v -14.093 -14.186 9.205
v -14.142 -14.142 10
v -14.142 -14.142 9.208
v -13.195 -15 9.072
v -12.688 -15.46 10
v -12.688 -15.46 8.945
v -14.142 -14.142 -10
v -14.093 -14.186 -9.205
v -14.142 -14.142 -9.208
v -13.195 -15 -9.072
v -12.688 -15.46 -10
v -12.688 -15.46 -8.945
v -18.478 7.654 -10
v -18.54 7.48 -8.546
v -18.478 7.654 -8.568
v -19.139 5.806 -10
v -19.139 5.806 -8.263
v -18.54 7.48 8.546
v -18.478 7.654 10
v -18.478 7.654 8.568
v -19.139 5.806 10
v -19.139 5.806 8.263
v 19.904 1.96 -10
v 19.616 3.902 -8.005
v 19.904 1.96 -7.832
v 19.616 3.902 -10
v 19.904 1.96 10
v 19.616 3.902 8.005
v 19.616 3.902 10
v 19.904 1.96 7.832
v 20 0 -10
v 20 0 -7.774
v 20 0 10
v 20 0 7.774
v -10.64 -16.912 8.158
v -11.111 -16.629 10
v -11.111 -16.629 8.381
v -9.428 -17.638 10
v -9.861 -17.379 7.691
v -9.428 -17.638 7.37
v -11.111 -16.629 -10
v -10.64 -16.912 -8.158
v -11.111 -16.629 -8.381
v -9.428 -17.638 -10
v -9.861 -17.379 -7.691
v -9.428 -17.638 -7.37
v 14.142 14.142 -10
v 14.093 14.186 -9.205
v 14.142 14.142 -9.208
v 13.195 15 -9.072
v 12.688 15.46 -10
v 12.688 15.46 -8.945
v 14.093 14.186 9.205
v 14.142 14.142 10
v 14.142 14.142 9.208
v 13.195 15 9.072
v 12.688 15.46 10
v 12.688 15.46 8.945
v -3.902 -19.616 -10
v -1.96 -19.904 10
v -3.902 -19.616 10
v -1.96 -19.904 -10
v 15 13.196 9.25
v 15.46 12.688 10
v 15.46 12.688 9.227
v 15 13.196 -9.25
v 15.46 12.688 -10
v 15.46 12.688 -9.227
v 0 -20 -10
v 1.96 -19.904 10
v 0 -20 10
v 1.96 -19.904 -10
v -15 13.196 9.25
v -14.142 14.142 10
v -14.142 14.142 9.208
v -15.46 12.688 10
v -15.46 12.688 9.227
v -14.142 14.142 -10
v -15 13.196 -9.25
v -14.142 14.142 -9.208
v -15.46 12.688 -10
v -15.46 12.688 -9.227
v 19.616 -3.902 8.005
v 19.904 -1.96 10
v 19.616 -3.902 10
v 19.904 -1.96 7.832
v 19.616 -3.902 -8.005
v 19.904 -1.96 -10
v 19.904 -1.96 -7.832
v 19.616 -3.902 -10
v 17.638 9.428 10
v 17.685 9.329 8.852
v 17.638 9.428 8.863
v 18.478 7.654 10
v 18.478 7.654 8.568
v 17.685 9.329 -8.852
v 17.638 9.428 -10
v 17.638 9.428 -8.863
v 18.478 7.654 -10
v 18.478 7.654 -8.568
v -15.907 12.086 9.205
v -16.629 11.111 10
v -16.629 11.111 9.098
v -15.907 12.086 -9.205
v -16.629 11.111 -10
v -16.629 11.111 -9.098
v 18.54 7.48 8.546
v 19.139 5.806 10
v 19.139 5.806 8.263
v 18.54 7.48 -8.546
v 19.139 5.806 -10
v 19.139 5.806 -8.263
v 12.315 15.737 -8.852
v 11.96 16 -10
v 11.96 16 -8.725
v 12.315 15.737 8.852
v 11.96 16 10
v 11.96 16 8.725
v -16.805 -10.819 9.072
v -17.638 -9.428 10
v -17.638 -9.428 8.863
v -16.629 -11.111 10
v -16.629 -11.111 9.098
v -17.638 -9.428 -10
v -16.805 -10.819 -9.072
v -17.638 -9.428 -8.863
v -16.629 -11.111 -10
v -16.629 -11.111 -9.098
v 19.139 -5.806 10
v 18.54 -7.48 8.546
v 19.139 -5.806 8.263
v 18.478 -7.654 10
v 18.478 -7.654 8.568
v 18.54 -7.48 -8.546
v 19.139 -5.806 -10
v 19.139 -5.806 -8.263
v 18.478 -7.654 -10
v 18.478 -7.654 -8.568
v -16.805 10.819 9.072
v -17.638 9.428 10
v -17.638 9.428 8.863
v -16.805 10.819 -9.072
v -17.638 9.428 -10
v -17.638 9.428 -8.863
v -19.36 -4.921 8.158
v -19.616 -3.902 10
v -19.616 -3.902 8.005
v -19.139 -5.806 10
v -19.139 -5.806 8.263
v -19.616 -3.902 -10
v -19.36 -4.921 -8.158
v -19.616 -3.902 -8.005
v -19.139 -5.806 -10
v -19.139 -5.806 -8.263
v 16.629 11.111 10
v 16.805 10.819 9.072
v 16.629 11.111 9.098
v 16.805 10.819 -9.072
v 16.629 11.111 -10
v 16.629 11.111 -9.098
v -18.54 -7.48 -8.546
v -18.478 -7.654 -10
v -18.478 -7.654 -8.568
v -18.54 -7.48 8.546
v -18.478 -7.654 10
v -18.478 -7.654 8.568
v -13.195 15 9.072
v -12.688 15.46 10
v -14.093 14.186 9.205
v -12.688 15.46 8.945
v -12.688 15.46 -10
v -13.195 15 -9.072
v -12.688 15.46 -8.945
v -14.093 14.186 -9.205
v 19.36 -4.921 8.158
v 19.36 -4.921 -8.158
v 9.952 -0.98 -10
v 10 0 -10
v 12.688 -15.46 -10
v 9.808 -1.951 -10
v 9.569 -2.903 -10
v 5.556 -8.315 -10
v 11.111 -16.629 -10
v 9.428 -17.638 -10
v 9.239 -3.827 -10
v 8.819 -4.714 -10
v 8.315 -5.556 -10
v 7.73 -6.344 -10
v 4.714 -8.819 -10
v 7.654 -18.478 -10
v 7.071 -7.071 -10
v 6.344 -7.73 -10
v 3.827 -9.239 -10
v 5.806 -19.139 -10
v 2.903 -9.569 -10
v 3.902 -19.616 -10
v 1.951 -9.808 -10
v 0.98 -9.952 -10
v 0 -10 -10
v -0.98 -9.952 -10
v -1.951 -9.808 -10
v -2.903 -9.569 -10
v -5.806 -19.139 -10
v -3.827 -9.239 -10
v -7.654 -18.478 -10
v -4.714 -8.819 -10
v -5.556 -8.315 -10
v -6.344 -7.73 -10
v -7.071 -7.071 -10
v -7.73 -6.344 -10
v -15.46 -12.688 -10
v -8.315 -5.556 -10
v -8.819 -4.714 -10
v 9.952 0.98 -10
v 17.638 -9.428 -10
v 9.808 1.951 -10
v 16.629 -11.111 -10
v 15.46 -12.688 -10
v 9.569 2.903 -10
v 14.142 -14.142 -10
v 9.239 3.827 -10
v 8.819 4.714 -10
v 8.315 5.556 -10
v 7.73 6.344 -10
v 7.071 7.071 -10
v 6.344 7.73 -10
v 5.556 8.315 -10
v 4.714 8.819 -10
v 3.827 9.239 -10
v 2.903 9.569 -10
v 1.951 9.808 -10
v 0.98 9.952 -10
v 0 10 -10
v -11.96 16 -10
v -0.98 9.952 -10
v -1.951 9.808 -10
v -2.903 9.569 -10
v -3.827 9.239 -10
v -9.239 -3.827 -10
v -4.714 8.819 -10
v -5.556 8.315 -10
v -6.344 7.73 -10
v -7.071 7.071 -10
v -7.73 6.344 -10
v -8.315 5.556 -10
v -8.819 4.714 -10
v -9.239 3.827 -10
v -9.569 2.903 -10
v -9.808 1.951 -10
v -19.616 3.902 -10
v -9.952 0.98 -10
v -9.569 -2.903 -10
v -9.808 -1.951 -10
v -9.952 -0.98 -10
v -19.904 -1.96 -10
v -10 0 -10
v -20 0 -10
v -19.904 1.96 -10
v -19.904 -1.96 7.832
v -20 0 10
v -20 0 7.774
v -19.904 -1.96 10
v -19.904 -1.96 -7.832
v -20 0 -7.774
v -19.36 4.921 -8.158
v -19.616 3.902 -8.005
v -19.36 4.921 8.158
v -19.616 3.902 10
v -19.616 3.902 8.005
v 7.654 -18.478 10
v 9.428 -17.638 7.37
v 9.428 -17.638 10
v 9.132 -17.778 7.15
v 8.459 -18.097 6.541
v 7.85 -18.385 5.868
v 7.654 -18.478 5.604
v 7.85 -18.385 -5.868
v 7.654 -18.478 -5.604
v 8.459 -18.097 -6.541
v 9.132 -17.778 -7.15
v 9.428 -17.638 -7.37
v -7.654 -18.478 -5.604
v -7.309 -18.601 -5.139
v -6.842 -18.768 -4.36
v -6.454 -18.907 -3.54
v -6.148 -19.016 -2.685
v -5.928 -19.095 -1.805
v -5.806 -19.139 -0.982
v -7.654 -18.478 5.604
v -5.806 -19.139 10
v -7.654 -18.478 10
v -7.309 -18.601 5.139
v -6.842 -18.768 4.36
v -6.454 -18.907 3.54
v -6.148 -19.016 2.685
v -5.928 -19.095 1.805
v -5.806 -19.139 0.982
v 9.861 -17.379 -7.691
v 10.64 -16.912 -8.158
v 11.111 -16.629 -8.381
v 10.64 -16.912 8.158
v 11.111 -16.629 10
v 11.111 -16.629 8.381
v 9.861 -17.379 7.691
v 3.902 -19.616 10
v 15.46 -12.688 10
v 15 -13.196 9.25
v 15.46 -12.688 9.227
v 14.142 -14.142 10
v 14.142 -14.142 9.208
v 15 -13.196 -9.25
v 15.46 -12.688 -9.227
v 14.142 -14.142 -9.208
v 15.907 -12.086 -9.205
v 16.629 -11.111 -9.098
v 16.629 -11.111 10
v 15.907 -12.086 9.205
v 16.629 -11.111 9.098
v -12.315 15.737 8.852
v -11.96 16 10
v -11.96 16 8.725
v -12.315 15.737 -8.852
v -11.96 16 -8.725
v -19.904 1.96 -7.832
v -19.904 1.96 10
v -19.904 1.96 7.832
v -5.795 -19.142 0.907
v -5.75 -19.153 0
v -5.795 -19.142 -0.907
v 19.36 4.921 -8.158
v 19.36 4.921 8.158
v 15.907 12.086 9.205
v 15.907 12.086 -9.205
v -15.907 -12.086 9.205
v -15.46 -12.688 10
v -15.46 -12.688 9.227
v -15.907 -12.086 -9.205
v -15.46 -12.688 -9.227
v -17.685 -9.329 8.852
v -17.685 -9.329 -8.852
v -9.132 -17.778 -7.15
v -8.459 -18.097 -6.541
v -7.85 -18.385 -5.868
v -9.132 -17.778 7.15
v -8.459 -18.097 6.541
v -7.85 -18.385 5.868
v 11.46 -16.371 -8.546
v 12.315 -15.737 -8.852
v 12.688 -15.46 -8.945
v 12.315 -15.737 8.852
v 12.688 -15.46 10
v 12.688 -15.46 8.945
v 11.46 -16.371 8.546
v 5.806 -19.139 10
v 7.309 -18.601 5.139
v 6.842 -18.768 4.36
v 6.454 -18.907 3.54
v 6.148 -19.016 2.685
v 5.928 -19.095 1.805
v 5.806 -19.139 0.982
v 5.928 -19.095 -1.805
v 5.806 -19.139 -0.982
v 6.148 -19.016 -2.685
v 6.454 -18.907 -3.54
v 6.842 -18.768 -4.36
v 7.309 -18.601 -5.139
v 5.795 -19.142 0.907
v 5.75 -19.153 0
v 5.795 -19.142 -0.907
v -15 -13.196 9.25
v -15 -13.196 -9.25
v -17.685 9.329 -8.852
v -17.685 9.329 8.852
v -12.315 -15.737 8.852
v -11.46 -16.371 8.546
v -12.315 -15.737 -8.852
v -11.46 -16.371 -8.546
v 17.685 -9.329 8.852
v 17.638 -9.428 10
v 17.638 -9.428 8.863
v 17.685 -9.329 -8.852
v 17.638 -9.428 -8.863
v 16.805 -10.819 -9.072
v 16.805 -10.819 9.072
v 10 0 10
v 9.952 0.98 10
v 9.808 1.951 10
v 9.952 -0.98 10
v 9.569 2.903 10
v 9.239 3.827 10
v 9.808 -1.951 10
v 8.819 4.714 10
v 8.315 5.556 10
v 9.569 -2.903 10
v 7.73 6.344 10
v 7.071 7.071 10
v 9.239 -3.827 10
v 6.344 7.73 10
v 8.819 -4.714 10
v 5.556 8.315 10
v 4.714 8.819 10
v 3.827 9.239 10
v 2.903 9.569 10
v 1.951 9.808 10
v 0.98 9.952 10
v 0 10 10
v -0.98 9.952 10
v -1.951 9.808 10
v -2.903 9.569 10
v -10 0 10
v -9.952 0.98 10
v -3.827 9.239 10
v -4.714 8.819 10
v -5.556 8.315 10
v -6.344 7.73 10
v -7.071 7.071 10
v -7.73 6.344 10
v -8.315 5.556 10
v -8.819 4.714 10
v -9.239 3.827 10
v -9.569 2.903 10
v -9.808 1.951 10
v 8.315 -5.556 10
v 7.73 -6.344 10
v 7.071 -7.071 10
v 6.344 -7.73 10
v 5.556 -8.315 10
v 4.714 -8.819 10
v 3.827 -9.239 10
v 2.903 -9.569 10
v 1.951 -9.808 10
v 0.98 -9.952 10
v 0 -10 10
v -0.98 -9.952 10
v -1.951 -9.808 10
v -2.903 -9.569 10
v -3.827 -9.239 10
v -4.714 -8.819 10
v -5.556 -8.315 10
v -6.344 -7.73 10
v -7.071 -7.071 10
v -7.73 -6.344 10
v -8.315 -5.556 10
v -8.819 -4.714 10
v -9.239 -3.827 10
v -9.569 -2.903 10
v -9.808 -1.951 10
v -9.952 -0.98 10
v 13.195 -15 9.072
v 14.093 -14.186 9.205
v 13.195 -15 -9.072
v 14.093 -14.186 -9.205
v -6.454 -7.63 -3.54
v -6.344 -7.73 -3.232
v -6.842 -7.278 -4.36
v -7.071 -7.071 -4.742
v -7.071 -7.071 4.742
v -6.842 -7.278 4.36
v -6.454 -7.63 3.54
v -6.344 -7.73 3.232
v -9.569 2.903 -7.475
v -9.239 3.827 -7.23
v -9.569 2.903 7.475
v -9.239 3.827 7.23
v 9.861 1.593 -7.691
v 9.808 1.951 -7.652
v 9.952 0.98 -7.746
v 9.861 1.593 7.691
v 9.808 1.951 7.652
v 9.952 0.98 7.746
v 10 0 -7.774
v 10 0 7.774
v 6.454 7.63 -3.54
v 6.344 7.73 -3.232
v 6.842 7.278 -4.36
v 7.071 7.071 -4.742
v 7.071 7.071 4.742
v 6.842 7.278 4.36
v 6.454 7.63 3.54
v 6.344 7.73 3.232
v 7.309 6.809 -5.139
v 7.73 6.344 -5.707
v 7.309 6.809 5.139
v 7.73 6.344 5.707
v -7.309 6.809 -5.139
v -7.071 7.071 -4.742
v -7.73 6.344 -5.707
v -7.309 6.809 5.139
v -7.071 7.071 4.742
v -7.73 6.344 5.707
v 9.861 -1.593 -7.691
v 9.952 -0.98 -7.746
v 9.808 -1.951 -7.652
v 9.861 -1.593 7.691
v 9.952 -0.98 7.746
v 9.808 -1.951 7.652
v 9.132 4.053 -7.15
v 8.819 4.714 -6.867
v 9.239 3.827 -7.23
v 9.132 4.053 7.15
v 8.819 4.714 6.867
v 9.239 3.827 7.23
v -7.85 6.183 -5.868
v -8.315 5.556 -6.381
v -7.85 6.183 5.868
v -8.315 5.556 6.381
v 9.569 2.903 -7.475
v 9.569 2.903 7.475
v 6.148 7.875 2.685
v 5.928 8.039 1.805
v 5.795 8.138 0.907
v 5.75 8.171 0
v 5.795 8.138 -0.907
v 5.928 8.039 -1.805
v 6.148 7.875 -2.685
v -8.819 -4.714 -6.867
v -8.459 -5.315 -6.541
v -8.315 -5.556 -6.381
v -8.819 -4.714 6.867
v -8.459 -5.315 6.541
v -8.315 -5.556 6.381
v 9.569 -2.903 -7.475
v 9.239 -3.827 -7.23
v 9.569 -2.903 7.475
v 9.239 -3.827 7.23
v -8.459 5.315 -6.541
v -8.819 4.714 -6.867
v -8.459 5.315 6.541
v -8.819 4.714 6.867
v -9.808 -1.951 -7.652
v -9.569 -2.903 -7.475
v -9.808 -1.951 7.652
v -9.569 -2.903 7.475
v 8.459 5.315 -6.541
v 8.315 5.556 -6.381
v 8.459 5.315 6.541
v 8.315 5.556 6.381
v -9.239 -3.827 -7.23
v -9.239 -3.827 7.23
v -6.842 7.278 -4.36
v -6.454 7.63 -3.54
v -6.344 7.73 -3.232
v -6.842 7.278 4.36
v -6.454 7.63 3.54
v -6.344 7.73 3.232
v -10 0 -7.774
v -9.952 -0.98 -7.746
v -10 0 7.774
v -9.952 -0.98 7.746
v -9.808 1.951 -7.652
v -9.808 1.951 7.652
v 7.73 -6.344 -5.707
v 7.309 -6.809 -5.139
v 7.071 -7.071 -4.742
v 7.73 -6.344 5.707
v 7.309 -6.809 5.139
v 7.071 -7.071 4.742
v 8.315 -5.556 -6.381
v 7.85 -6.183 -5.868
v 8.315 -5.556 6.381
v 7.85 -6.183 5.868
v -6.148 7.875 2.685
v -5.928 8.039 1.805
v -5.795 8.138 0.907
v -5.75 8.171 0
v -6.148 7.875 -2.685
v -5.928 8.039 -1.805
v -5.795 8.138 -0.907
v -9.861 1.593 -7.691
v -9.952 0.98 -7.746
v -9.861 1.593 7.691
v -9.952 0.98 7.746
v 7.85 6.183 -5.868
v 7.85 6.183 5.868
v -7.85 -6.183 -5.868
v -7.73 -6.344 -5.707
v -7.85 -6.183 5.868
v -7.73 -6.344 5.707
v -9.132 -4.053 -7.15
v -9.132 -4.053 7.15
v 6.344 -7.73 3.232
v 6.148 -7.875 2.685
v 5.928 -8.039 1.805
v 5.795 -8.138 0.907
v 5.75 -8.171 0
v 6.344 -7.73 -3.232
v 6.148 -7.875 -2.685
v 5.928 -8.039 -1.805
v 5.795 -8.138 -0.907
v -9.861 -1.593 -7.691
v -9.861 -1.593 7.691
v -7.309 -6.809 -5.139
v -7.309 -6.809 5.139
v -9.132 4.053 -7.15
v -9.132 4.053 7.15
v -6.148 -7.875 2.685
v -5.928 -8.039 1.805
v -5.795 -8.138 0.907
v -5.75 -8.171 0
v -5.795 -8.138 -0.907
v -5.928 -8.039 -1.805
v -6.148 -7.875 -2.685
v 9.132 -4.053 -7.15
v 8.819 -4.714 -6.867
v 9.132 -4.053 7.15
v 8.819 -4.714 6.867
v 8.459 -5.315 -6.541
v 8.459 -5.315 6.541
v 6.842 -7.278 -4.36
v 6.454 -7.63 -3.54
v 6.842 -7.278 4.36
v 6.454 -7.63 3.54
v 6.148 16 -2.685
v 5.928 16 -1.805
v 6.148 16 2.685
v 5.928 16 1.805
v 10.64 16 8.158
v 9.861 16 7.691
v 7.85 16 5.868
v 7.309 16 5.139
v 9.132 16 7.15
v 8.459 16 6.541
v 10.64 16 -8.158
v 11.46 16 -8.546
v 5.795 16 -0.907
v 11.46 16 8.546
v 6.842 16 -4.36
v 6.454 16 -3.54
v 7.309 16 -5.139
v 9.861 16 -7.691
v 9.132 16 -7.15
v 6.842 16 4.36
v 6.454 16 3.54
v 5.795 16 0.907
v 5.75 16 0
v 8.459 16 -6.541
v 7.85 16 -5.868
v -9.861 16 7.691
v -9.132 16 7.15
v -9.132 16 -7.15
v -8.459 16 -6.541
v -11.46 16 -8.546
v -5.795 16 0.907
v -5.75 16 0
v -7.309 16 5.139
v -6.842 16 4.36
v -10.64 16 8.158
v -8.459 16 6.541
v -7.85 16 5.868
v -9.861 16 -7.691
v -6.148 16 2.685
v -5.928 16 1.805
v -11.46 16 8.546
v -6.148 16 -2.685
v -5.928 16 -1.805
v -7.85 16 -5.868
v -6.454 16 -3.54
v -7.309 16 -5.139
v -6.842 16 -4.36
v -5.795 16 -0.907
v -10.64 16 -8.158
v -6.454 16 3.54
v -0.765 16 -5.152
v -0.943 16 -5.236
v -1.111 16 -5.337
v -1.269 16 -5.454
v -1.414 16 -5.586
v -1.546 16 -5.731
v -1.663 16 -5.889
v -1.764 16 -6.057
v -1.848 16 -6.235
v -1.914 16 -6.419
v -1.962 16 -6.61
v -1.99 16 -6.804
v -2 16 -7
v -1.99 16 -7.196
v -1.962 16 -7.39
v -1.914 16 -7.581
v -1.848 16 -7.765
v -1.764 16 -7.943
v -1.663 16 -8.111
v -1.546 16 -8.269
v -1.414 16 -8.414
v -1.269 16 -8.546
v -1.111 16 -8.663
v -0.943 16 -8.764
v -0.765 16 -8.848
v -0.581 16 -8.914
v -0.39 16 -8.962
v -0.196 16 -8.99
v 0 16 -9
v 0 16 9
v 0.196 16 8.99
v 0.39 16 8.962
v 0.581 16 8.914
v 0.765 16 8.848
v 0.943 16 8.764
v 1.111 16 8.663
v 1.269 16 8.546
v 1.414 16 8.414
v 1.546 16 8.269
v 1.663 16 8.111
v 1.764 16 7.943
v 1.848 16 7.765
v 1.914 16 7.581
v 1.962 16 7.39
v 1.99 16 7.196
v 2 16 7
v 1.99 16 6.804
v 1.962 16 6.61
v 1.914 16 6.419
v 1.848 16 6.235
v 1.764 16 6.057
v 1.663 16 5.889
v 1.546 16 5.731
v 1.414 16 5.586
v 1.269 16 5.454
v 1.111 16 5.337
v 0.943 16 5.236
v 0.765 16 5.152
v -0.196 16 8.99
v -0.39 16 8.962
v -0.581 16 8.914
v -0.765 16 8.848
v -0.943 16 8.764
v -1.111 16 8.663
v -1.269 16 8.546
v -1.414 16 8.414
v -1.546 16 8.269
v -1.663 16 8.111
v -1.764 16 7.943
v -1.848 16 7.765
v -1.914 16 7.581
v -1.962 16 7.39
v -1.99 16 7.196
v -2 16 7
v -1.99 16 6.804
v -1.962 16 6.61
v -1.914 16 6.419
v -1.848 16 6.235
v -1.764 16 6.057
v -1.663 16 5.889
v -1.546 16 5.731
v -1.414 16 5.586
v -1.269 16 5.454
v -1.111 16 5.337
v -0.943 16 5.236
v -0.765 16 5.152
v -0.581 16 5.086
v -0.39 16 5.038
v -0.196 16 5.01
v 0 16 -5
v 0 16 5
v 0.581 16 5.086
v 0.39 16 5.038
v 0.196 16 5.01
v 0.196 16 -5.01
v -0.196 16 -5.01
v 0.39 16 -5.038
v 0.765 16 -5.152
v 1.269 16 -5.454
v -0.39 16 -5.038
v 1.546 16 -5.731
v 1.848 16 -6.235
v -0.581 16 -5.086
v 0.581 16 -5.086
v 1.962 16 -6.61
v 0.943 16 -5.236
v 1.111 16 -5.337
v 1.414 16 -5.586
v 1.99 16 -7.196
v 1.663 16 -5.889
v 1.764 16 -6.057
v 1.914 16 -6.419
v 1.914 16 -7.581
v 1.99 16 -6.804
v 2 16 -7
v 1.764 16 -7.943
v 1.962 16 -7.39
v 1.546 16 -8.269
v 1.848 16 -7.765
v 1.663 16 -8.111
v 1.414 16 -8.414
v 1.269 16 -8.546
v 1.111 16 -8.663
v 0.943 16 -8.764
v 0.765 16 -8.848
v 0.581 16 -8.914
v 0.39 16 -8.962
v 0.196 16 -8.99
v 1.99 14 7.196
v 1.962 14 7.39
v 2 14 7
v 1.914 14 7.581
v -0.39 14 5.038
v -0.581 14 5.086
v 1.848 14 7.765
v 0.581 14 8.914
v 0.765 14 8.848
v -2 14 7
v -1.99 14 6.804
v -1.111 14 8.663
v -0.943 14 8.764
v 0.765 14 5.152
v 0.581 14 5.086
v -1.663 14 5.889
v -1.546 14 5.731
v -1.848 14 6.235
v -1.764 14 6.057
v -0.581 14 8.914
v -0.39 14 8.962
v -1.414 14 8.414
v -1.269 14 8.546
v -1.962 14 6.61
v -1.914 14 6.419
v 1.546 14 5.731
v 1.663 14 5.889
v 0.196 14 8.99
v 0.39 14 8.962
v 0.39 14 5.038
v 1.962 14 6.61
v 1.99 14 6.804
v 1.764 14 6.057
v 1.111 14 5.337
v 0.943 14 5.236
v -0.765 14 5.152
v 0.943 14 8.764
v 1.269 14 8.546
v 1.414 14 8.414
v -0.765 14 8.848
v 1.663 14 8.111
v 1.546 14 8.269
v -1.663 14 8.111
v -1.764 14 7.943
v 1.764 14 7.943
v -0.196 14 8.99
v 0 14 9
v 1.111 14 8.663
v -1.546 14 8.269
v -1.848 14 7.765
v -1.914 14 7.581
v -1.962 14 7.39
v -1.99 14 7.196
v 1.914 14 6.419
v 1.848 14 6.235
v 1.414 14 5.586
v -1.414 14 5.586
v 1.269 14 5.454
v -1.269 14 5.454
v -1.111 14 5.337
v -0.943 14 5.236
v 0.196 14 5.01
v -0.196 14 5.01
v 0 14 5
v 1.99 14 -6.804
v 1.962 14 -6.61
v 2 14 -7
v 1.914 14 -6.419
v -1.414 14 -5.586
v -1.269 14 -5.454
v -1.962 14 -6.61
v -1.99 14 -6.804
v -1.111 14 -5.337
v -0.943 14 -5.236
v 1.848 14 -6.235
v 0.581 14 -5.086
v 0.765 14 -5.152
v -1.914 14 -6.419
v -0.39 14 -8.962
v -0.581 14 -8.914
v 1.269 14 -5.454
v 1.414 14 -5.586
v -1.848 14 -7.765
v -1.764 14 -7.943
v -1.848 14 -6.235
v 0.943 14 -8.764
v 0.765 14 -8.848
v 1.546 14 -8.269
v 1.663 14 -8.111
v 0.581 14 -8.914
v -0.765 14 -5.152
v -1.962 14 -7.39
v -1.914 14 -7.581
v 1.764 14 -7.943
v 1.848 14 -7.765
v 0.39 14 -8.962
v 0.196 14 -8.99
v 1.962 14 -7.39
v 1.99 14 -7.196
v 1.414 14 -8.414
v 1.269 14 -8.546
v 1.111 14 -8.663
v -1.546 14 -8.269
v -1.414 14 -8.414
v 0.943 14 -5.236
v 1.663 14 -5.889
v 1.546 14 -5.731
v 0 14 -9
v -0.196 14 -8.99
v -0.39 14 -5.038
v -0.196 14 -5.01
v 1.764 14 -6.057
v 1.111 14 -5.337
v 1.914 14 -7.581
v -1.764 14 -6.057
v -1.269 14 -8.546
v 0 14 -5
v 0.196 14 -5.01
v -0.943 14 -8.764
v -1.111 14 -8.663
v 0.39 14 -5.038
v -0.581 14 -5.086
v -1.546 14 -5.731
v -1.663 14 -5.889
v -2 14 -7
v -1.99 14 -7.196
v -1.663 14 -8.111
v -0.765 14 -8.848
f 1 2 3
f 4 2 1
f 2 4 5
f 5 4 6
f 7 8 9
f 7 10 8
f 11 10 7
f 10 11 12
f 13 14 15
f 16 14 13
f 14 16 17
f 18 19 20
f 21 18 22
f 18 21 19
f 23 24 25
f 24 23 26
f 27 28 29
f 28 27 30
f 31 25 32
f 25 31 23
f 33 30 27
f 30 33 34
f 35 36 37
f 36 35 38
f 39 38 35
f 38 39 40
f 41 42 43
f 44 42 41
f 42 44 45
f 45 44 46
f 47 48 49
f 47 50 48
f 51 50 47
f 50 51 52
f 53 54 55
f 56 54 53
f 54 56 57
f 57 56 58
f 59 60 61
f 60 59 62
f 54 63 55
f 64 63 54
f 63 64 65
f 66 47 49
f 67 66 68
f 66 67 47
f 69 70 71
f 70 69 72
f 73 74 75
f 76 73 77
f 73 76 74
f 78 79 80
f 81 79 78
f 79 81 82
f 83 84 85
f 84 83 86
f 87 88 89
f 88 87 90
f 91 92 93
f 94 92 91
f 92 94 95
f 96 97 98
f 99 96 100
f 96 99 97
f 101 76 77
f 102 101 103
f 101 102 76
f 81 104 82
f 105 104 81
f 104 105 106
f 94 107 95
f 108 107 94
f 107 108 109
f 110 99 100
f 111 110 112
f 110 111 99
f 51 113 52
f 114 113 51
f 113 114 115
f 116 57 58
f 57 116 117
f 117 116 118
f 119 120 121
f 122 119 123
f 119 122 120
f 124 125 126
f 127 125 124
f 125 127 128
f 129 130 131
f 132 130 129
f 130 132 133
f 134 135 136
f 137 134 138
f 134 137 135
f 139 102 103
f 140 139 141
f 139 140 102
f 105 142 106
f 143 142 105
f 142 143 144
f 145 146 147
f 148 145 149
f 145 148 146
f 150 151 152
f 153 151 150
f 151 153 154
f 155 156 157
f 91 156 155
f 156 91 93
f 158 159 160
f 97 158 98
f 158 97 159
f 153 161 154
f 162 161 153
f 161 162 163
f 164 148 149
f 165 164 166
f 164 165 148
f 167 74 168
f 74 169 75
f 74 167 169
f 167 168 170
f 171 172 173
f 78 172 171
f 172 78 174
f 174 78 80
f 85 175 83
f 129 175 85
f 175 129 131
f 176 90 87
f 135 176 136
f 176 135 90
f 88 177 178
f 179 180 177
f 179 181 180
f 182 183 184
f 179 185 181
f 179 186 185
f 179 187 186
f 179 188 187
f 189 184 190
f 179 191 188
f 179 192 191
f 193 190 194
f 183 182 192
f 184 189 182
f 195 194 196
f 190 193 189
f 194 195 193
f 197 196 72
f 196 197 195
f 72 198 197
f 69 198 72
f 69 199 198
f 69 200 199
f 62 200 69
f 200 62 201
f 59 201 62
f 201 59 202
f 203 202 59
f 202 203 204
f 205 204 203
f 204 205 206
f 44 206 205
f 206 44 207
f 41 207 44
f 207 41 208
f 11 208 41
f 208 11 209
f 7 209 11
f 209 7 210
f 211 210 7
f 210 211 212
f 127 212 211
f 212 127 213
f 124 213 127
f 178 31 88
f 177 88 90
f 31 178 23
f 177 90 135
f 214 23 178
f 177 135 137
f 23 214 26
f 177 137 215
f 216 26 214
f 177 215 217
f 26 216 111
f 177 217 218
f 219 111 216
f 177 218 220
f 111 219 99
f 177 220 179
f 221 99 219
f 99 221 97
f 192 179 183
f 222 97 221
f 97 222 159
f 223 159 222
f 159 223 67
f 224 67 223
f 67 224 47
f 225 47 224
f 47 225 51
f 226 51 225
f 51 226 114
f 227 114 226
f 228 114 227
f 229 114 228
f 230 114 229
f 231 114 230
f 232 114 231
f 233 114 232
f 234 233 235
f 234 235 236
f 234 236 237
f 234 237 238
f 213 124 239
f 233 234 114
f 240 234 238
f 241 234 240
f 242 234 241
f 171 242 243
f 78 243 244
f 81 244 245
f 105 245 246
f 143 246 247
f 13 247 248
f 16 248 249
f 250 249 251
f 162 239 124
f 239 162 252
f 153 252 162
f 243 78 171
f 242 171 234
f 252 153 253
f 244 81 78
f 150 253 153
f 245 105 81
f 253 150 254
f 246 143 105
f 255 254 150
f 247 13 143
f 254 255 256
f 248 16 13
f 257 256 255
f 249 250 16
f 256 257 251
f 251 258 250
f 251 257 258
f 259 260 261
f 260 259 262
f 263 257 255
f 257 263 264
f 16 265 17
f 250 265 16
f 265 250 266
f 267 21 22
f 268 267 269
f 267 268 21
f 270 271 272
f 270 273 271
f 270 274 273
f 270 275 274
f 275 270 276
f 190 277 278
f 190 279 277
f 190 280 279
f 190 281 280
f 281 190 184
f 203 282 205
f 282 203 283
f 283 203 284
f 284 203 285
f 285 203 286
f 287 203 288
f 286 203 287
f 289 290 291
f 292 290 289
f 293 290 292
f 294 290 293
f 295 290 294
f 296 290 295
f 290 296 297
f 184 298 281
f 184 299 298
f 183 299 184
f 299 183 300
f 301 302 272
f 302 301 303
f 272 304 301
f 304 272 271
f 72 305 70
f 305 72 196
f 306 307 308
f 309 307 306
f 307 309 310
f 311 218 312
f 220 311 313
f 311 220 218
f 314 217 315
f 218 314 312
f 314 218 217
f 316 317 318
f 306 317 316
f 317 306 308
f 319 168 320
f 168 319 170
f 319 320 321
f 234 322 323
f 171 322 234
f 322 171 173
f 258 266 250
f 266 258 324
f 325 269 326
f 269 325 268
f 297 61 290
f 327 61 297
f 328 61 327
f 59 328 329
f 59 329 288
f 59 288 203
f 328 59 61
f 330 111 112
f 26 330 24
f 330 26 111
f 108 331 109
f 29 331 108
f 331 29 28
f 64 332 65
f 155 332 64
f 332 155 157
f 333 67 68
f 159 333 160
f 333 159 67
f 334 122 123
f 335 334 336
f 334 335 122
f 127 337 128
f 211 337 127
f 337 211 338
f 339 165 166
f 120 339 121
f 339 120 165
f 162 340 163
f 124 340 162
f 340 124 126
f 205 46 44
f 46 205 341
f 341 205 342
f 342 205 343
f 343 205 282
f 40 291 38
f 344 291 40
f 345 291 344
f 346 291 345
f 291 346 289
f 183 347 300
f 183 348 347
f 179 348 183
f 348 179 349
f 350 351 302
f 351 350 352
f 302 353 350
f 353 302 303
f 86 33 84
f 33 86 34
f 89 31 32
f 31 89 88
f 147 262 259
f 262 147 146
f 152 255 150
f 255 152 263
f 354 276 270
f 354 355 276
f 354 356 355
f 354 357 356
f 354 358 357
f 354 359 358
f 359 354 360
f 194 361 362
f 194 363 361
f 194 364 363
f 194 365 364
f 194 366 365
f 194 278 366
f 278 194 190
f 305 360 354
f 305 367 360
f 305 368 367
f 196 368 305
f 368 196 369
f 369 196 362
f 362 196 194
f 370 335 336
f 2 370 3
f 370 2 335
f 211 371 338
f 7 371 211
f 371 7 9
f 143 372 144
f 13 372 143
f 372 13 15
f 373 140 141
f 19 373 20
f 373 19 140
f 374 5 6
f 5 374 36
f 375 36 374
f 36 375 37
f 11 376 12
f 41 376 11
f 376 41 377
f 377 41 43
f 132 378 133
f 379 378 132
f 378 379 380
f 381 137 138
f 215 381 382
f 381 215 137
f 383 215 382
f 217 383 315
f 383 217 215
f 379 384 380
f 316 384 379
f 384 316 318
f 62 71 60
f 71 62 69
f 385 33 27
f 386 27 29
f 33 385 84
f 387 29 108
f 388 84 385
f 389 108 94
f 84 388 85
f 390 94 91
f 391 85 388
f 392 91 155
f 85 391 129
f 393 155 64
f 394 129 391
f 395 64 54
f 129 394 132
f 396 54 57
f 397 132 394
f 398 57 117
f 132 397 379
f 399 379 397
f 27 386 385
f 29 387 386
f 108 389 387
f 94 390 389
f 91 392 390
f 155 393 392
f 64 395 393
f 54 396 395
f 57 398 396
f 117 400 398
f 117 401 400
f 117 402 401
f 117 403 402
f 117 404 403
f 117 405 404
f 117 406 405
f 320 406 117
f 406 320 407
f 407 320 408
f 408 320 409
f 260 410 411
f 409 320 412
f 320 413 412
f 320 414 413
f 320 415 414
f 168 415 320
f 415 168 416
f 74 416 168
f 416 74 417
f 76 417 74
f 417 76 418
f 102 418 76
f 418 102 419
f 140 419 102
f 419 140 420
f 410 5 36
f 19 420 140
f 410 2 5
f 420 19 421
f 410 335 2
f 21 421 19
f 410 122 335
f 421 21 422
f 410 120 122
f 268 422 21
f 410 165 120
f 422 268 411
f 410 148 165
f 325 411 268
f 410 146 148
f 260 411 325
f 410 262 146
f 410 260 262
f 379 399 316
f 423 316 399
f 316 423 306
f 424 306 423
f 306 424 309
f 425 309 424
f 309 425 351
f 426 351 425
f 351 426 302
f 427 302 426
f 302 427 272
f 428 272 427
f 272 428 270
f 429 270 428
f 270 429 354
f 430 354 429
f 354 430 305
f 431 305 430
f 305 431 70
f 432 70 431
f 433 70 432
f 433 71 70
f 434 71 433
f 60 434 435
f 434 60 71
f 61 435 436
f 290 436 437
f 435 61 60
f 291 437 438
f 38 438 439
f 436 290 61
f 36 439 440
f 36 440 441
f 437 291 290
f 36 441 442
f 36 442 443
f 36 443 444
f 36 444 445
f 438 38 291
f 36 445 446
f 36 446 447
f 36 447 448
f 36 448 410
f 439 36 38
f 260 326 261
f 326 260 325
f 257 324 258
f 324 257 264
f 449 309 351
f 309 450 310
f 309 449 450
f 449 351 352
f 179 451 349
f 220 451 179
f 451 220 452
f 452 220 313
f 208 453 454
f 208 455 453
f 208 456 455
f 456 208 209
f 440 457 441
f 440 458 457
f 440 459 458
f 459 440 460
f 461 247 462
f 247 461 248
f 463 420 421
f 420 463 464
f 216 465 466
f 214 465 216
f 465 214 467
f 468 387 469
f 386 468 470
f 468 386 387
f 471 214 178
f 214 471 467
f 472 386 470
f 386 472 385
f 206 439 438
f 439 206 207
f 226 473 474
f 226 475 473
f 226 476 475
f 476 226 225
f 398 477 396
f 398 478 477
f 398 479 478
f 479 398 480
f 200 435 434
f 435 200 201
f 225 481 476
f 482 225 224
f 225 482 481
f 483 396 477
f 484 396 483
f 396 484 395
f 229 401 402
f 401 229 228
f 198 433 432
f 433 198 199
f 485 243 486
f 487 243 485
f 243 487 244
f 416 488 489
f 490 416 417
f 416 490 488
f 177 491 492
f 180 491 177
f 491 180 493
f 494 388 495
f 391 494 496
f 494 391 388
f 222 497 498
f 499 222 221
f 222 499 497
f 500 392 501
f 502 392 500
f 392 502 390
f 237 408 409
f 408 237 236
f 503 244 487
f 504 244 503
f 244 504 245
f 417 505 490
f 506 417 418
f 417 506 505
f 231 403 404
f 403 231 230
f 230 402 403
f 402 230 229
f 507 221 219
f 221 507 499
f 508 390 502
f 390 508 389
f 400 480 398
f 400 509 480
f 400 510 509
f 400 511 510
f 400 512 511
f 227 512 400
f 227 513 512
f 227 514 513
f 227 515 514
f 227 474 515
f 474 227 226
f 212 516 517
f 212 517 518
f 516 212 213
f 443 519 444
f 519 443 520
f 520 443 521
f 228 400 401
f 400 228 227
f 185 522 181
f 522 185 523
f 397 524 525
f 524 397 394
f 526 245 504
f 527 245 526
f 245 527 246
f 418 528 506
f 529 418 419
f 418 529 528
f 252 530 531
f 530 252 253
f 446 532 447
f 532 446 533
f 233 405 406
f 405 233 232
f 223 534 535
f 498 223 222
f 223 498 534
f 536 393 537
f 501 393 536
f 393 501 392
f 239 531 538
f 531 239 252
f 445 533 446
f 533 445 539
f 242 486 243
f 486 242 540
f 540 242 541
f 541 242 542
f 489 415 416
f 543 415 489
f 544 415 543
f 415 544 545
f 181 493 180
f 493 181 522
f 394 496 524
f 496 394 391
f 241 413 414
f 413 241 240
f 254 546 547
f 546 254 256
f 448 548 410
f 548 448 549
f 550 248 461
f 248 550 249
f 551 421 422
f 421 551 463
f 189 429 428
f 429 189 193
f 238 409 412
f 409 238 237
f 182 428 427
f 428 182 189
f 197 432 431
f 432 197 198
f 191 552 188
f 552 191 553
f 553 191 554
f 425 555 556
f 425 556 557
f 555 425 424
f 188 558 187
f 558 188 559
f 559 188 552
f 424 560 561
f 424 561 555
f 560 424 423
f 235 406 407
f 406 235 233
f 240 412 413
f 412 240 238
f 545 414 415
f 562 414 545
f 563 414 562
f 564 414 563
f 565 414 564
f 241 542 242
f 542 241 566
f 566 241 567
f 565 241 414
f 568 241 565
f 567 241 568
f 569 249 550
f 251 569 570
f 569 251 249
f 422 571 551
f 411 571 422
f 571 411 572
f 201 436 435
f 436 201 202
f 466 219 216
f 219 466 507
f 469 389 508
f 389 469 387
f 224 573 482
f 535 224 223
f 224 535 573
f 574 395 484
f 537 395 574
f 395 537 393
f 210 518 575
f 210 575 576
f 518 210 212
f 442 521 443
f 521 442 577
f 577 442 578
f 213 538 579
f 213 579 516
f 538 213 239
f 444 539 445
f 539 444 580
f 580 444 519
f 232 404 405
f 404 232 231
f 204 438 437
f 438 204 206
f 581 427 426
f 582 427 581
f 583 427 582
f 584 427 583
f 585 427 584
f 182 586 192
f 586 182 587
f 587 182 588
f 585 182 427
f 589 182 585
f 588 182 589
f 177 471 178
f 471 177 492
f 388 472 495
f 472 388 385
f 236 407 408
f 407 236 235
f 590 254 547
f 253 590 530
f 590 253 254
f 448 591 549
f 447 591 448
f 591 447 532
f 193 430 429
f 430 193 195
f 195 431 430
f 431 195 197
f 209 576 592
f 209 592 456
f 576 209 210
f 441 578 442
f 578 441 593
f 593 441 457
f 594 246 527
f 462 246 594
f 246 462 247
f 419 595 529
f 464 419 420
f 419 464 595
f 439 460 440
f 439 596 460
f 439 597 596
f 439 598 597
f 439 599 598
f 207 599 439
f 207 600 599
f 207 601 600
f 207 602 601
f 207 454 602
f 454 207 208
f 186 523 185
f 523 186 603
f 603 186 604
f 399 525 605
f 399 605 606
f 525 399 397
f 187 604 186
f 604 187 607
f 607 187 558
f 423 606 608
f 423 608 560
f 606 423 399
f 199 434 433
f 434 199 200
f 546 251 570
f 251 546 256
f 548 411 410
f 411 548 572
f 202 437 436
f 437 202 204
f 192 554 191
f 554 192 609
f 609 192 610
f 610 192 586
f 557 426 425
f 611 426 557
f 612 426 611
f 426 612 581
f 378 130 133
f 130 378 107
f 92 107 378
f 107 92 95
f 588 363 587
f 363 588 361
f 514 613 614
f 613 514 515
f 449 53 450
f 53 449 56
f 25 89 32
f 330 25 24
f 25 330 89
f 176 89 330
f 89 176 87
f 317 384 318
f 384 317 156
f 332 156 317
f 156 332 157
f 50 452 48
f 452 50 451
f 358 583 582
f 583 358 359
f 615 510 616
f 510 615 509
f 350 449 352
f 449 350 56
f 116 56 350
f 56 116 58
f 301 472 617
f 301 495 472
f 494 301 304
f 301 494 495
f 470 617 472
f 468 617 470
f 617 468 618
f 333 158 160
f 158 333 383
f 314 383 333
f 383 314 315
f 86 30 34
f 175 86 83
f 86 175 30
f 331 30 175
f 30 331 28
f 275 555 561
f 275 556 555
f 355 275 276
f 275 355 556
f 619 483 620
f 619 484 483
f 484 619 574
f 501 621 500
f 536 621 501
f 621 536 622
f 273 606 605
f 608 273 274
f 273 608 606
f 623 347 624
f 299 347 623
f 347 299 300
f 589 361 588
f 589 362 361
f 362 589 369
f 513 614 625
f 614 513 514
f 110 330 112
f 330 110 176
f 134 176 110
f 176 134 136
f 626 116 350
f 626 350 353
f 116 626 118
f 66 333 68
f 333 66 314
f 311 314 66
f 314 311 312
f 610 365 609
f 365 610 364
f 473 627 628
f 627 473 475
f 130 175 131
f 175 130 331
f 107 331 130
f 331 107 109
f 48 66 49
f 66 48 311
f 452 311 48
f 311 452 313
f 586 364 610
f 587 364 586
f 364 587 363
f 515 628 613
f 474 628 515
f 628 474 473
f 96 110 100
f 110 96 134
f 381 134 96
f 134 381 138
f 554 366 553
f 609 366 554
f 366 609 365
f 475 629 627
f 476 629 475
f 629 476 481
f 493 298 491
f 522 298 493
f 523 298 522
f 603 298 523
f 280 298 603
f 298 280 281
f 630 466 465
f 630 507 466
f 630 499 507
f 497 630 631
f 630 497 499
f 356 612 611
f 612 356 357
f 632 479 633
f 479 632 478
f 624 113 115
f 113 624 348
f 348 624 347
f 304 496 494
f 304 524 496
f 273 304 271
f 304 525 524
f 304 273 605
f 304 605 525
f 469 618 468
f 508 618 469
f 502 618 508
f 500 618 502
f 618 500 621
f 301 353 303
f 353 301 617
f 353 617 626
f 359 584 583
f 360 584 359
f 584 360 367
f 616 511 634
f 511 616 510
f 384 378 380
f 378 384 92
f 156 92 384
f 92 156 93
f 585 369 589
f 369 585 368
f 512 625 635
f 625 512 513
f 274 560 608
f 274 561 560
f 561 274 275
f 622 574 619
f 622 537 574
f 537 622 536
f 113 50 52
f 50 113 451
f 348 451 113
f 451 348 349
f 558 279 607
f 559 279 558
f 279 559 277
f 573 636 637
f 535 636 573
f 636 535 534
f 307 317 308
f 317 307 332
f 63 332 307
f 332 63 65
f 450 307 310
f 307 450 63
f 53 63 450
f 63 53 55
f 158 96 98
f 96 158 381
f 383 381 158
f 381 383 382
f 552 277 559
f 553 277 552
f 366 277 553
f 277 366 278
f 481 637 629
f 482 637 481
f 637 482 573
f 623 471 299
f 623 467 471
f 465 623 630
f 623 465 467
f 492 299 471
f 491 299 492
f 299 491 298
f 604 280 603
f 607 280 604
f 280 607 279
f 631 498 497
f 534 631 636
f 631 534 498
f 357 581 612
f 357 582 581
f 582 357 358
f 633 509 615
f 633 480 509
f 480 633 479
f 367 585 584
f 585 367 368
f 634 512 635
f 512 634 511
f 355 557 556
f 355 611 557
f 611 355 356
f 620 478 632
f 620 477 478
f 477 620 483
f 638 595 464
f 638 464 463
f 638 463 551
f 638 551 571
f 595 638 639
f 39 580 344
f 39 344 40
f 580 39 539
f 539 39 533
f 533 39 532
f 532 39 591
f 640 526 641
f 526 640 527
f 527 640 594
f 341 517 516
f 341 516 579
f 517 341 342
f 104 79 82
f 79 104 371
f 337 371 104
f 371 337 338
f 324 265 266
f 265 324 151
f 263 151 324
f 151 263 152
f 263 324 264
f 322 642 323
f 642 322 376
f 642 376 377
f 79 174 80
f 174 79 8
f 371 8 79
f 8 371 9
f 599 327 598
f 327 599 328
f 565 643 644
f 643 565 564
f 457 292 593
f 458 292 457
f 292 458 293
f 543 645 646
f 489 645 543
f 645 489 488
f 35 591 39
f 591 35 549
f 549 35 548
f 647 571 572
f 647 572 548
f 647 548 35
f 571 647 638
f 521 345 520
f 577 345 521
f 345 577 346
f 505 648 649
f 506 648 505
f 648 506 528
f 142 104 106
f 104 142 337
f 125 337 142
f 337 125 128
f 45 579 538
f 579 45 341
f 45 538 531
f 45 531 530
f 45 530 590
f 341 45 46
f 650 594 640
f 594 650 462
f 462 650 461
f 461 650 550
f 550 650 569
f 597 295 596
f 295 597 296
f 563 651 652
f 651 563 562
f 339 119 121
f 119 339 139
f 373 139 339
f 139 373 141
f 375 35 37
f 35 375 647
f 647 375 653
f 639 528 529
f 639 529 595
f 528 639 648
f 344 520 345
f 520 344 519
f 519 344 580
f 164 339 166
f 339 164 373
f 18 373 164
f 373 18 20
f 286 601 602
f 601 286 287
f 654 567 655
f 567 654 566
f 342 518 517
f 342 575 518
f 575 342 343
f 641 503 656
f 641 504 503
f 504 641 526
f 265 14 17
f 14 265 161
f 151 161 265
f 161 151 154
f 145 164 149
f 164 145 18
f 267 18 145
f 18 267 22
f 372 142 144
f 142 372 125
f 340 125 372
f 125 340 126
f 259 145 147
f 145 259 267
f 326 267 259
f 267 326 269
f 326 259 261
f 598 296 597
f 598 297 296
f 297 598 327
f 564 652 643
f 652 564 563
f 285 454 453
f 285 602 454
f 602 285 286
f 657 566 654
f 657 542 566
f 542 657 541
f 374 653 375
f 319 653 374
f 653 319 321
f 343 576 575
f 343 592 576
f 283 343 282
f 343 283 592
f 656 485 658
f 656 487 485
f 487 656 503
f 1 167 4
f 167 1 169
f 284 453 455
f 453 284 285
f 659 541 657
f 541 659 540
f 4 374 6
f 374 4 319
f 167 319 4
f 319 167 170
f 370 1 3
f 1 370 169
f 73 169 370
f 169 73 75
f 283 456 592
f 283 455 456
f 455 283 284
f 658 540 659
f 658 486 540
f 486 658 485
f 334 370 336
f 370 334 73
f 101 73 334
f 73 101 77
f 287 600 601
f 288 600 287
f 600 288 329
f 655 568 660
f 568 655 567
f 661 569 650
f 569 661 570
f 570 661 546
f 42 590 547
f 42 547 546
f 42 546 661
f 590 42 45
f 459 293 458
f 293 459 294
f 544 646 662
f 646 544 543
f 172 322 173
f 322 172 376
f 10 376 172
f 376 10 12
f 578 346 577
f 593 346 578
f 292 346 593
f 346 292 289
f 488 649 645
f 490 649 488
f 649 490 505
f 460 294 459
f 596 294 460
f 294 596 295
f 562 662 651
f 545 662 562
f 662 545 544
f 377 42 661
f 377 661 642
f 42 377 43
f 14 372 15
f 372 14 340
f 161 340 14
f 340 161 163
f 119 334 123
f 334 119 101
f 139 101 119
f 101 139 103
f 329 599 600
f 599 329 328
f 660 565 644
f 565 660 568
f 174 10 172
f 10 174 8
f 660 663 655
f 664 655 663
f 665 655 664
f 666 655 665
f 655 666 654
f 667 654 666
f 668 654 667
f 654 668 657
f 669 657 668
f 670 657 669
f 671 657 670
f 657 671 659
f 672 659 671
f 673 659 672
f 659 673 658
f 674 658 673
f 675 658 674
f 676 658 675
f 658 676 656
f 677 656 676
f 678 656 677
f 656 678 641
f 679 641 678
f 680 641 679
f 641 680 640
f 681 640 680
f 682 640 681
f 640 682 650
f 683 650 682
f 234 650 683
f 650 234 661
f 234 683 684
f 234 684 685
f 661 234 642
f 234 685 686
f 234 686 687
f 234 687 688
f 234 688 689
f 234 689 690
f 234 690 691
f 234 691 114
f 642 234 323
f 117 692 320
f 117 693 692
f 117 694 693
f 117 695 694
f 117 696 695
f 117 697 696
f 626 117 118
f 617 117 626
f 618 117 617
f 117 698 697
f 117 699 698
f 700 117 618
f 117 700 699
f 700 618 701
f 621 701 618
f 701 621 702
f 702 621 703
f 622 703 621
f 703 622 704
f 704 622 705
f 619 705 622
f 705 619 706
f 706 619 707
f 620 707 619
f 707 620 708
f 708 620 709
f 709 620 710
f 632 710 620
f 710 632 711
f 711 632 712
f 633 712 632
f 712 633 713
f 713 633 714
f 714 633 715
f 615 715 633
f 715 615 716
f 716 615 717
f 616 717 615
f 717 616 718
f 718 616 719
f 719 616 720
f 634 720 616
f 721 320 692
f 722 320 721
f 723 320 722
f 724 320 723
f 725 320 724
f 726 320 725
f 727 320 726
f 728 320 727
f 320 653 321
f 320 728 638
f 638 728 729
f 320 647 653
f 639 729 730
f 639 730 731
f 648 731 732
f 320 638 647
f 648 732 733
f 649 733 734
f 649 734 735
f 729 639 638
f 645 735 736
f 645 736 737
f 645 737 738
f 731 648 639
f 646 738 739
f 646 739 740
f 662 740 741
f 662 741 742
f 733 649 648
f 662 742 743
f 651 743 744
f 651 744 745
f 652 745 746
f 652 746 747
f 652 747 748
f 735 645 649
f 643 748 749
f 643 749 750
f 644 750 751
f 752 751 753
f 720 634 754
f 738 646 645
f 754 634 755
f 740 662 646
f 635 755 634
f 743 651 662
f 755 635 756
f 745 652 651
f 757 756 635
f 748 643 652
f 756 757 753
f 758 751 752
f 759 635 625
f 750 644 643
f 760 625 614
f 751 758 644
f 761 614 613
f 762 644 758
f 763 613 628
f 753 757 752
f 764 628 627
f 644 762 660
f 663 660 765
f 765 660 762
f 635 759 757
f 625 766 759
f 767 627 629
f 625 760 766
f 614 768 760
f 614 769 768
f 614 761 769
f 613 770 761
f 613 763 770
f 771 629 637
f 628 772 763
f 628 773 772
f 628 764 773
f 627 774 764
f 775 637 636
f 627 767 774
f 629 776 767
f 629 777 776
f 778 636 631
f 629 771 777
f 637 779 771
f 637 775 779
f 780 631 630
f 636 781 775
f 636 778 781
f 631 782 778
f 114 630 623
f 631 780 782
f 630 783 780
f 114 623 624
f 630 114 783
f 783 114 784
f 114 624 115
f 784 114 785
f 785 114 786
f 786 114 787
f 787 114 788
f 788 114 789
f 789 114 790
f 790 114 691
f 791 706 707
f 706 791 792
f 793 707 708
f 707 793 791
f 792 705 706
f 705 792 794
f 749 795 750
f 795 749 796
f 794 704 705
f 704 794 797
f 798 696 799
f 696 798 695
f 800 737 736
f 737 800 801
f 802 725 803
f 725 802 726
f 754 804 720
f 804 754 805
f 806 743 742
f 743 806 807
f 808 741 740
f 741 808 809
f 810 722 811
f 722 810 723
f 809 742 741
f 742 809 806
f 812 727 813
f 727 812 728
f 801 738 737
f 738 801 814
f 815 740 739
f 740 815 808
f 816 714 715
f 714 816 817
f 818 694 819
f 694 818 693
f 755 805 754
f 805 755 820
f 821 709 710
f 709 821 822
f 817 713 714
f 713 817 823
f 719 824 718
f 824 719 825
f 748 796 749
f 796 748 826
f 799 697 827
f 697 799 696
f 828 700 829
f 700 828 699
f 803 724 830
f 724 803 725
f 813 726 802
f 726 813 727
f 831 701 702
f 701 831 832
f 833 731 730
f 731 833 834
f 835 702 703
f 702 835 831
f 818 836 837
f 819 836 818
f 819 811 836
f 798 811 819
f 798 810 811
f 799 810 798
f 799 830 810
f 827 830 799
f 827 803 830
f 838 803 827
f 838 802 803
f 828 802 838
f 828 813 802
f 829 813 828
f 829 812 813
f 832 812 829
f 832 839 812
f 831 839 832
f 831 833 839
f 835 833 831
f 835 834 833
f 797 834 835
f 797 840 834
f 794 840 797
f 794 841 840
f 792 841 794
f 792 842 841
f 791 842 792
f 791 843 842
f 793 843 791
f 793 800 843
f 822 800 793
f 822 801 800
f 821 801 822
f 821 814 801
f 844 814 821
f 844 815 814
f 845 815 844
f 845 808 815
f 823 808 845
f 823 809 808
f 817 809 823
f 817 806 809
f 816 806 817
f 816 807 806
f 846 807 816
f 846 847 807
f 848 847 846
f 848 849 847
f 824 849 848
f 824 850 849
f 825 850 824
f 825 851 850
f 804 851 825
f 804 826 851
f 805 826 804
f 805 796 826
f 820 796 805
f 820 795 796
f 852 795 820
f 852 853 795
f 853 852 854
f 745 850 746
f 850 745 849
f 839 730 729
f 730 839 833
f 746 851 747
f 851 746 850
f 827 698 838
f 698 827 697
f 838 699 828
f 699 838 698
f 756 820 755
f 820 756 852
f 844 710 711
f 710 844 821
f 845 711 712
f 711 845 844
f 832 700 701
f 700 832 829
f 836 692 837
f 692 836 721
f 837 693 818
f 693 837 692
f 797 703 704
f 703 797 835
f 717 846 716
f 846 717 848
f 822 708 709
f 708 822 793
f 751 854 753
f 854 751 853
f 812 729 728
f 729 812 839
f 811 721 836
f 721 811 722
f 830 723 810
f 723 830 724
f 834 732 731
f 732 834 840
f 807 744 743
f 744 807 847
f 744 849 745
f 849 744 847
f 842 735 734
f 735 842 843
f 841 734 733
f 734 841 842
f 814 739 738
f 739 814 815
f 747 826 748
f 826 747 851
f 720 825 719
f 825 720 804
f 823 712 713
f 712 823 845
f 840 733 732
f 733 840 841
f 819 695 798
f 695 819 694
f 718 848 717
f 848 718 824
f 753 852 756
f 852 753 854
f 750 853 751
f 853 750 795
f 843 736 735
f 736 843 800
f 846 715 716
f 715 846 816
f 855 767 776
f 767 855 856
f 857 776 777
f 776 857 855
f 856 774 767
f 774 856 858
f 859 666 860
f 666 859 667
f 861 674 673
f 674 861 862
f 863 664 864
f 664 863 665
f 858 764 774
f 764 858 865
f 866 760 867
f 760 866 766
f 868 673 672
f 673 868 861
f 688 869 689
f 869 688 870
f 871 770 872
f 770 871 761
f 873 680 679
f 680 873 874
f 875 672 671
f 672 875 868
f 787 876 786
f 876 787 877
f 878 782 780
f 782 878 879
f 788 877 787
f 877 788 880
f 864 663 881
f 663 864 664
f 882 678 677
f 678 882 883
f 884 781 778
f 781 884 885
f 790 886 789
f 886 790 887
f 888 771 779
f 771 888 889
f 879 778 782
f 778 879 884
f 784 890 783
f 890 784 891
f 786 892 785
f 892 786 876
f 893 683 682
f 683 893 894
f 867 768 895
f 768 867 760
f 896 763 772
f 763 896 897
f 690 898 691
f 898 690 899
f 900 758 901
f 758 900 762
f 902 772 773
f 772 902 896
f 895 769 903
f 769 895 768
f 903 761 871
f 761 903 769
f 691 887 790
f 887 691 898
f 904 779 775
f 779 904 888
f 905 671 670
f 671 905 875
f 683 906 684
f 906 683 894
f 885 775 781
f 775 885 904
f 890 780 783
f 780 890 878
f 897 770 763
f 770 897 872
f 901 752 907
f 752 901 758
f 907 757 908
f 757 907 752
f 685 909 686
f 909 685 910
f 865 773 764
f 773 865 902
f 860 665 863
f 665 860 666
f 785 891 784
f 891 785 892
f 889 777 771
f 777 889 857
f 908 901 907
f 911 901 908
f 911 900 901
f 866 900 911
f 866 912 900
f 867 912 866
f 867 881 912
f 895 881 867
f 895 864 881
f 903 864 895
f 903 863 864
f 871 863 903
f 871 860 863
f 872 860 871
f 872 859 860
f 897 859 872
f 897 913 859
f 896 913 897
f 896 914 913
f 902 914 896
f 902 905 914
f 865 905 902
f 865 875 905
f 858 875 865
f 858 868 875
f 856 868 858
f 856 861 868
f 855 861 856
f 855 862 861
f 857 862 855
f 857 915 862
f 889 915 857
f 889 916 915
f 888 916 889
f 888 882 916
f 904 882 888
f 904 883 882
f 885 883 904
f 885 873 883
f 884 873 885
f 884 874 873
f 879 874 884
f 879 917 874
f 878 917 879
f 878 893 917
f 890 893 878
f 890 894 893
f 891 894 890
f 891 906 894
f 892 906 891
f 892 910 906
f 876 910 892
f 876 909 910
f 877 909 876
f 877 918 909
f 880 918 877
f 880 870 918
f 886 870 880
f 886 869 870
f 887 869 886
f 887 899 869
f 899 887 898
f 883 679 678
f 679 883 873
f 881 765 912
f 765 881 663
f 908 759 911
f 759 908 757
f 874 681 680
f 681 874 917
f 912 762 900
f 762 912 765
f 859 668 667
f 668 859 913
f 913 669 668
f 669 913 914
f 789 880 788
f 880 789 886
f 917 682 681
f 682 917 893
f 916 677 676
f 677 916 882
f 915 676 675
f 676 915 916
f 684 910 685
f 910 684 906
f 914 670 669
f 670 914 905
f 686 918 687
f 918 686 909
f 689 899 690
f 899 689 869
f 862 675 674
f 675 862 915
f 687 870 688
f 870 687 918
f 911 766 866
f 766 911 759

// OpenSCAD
// COBRA Vertebra - T8 V14
// Height: 20.0mm, OD: 40.0mm

$fn = 64;

difference() {
    // Outer cylinder
    cylinder(h=20.0, d=40.0, center=true);
    
    // Inner channel
    cylinder(h=22.0, d=20.0, center=true);

    // Battery cavity 1
    rotate([0, 0, 0])
    translate([15.0, 0, 0])
    rotate([90, 0, 0])
    cylinder(h=74.0, d=18.5, center=true);

    // Battery cavity 2
    rotate([0, 0, 180])
    translate([15.0, 0, 0])
    rotate([90, 0, 0])
    cylinder(h=74.0, d=18.5, center=true);

    // Solar panel cavity
    translate([0, 18.0, 0])
    cube([50, 4, 30], center=true);

    // Pivot holes
    translate([0, 20.0, 7.0])
    rotate([90, 0, 0])
    cylinder(h=12.0, d=4, center=true);
    
    translate([0, 20.0, -7.0])
    rotate([90, 0, 0])
    cylinder(h=12.0, d=4, center=true);
}
